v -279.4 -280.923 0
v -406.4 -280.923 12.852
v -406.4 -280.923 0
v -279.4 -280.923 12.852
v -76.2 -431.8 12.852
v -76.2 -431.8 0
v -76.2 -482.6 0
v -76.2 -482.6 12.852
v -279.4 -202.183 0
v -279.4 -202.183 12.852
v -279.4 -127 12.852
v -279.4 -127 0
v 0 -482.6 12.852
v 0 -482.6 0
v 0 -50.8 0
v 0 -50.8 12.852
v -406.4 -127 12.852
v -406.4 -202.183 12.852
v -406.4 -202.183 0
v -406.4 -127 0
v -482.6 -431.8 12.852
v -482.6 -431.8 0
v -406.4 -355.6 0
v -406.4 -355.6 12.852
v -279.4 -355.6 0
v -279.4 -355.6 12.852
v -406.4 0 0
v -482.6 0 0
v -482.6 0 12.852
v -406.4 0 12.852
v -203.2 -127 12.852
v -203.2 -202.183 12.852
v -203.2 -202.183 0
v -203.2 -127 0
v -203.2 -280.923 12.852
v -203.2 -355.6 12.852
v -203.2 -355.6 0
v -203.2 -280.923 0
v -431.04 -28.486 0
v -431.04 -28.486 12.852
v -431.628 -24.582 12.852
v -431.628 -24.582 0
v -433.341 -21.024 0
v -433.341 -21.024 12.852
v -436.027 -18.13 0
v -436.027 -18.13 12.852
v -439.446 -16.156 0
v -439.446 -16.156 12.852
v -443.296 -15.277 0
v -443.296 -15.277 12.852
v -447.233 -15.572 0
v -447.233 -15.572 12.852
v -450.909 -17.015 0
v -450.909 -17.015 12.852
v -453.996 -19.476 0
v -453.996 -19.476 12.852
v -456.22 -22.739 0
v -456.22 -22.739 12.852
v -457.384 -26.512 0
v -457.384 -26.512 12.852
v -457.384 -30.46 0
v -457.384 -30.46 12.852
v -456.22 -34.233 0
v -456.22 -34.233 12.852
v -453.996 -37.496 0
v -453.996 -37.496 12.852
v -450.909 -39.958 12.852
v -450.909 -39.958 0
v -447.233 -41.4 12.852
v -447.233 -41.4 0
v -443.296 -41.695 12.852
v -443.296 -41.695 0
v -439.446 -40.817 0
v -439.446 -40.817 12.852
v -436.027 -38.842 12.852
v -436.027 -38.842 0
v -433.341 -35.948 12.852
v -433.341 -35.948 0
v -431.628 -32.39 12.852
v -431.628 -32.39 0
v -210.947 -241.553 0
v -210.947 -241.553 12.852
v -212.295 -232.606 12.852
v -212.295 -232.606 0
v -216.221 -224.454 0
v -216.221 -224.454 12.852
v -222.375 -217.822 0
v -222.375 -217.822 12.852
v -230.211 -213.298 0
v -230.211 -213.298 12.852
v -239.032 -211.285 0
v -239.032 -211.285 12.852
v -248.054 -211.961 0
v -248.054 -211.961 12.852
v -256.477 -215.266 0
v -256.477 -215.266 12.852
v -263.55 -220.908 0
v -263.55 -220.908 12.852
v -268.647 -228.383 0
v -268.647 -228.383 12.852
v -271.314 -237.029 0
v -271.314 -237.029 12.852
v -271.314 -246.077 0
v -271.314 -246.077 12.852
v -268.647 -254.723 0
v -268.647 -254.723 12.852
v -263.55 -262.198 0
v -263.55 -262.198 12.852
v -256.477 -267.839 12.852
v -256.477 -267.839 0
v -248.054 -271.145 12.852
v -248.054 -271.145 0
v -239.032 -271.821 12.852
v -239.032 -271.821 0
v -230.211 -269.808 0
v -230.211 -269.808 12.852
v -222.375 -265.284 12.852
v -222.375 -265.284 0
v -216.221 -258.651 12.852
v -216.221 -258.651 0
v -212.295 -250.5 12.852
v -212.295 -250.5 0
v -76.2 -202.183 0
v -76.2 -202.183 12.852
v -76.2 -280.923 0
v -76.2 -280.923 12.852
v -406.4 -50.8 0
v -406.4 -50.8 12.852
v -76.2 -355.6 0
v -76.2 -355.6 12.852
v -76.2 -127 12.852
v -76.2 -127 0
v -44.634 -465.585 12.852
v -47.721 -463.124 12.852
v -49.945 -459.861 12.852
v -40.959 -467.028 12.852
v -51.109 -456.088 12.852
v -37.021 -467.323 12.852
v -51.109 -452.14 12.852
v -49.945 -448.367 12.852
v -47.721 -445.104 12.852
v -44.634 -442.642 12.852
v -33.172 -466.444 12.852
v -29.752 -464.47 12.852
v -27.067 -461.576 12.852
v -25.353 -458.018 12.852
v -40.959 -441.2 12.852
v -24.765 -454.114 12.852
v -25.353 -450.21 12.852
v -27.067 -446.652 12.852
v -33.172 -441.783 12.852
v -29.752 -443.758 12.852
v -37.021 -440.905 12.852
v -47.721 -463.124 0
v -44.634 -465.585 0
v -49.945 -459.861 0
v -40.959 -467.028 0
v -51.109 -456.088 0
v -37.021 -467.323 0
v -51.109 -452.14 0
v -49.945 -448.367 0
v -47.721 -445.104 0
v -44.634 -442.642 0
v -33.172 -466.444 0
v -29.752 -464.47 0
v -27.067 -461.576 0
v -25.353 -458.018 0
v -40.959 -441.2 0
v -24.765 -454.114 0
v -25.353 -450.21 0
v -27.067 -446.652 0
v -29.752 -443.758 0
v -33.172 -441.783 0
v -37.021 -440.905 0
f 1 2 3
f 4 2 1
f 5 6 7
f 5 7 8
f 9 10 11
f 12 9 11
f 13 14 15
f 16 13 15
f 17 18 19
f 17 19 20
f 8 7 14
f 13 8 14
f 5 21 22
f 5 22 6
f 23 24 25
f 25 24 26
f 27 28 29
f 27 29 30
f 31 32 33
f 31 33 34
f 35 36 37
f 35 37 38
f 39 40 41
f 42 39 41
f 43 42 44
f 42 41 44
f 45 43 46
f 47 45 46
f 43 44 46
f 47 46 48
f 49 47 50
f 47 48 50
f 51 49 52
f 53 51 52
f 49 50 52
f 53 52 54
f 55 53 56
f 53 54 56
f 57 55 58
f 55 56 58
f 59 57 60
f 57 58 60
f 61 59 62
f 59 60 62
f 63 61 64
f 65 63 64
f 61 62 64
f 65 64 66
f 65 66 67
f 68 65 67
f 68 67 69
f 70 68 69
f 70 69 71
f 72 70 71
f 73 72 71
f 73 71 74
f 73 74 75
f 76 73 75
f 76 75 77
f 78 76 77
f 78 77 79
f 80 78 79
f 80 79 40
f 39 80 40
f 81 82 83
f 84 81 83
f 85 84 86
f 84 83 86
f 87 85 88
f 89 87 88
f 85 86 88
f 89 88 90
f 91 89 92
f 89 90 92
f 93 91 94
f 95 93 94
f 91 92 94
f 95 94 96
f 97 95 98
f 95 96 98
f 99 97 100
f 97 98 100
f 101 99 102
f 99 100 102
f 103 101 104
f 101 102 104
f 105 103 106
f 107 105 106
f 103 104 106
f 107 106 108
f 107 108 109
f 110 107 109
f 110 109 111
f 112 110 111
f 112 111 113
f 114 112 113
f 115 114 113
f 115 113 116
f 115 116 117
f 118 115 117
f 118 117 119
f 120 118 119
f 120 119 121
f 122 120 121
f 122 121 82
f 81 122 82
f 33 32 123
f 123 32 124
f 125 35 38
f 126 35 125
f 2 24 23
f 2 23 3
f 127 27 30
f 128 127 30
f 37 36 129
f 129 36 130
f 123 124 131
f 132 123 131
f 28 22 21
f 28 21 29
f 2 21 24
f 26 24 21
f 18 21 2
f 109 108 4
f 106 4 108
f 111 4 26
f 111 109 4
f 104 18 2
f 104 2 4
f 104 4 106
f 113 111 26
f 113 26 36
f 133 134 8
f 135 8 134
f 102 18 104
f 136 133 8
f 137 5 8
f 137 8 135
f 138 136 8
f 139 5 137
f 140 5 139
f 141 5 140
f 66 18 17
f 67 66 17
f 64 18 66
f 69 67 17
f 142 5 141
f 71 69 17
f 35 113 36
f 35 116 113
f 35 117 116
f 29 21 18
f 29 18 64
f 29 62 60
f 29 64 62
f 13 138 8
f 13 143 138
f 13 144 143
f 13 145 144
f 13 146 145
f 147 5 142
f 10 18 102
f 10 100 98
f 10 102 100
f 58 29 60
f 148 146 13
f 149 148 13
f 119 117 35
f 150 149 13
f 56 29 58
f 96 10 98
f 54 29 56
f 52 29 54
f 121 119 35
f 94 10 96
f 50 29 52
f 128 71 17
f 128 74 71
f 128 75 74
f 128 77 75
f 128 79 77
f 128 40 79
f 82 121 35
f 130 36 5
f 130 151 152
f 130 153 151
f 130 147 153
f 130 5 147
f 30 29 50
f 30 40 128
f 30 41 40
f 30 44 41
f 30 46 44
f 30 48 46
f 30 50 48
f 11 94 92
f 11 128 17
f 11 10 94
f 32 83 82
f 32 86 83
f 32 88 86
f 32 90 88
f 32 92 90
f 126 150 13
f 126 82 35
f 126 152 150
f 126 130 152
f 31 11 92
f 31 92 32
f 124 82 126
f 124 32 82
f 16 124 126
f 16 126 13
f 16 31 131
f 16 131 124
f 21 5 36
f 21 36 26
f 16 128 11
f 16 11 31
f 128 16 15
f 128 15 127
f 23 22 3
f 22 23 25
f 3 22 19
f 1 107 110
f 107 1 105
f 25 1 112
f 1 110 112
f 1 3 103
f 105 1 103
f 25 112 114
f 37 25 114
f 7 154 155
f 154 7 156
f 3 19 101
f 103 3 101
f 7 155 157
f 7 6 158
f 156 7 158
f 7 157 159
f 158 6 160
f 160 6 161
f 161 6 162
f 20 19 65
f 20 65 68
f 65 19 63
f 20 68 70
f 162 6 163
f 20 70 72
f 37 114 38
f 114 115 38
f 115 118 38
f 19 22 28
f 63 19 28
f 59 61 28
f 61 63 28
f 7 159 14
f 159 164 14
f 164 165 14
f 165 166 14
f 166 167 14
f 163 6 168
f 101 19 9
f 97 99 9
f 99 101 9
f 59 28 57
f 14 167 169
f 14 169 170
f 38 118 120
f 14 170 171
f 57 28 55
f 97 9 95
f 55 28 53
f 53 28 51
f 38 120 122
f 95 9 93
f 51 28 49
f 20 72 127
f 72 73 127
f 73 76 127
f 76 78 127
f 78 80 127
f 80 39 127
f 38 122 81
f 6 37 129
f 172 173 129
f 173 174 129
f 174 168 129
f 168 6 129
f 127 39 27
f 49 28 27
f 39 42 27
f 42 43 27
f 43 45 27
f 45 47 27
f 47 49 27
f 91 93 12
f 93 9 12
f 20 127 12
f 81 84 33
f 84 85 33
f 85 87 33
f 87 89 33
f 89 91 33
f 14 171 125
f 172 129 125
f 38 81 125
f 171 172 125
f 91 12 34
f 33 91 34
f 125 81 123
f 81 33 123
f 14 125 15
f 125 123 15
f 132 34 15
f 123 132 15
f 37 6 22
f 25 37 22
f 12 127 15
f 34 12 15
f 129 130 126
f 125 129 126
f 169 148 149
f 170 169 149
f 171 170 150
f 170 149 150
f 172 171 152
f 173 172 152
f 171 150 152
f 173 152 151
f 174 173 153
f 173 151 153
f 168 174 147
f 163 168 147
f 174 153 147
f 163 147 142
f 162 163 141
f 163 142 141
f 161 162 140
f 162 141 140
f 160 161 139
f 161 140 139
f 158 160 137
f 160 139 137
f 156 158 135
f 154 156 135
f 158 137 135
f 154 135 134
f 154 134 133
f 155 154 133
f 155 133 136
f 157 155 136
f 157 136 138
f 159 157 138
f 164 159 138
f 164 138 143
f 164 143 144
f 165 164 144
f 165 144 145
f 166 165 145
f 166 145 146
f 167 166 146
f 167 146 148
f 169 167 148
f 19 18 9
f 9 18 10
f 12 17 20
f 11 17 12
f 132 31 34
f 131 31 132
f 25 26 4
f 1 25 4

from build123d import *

# Parameters (mm, degrees)
F0_W      = 482.6
F0_H      = 482.6
F1_DEPTH  = 12.8524
F2_W      = 330.2
F2_H      = 12.8524
F2_W_2    = 76.2
F3_DEPTH  = 50.8
F4_W      = 330.2
F4_H      = 12.8524
F4_W_2    = 76.2
F5_DEPTH  = 50.8
F8_W      = 127
F8_H      = 74.67717
F8_H_2    = 75.18283
F9_W      = 127
F9_H      = 74.67717
F10_DEPTH = 25.4
F12_R     = 13.2461
F12_R_2   = 30.353
F13_DEPTH = 25.4


with BuildPart() as f1:
    # F0 (on Top) → F1 (new body)
    with BuildSketch(Plane.XY):
        with Locations((-241.3, -241.3)):
            Rectangle(F0_W, F0_H)
    extrude(amount=F1_DEPTH)

    # F2 (on face) → F3 (cut)
    with BuildSketch(Plane.XZ.offset(482.6)):
        with Locations((-241.3, 6.4262)):
            Rectangle(F2_W, F2_H)
        with Locations((-444.5, 6.4262)):
            Rectangle(F2_W_2, F2_H)
    extrude(amount=-F3_DEPTH, mode=Mode.SUBTRACT)

    # F4 (on face) → F5 (cut)
    with BuildSketch(Plane(origin=(0, 0, 0), x_dir=(-1, 0, 0), z_dir=(0, 1, 0))):
        with Locations((241.3, 6.4262)):
            Rectangle(F4_W, F4_H)
        with Locations((38.1, 6.4262)):
            Rectangle(F4_W_2, F4_H)
    extrude(amount=-F5_DEPTH, mode=Mode.SUBTRACT)

    # F8 (on face) + F9 (on face) → F10 (cut)
    with BuildSketch(Plane.XY.offset(12.8524)):
        with Locations((-139.7, -318.261415)):
            Rectangle(F8_W, F8_H)
        with Locations((-342.9, -164.591415)):
            Rectangle(F8_W, F8_H_2)
        with Locations((-139.7, -164.591415)):
            Rectangle(F8_W, F8_H_2)
    with BuildSketch(Plane.XY.offset(12.8524)):
        with Locations((-342.9, -318.261415)):
            Rectangle(F9_W, F9_H)
    extrude(amount=-F10_DEPTH, mode=Mode.SUBTRACT)

    # F12 (on face) → F13 (cut)
    with BuildSketch(Plane.XY.offset(12.8524)):
        with Locations((-444.285613, -28.4861)):
            Circle(F12_R)
        with Locations((-241.3, -241.55283)):
            Circle(F12_R_2)
        with Locations((-38.0111, -454.1139)):
            Circle(F12_R)
    extrude(amount=-F13_DEPTH, mode=Mode.SUBTRACT)


solid = f1.part
